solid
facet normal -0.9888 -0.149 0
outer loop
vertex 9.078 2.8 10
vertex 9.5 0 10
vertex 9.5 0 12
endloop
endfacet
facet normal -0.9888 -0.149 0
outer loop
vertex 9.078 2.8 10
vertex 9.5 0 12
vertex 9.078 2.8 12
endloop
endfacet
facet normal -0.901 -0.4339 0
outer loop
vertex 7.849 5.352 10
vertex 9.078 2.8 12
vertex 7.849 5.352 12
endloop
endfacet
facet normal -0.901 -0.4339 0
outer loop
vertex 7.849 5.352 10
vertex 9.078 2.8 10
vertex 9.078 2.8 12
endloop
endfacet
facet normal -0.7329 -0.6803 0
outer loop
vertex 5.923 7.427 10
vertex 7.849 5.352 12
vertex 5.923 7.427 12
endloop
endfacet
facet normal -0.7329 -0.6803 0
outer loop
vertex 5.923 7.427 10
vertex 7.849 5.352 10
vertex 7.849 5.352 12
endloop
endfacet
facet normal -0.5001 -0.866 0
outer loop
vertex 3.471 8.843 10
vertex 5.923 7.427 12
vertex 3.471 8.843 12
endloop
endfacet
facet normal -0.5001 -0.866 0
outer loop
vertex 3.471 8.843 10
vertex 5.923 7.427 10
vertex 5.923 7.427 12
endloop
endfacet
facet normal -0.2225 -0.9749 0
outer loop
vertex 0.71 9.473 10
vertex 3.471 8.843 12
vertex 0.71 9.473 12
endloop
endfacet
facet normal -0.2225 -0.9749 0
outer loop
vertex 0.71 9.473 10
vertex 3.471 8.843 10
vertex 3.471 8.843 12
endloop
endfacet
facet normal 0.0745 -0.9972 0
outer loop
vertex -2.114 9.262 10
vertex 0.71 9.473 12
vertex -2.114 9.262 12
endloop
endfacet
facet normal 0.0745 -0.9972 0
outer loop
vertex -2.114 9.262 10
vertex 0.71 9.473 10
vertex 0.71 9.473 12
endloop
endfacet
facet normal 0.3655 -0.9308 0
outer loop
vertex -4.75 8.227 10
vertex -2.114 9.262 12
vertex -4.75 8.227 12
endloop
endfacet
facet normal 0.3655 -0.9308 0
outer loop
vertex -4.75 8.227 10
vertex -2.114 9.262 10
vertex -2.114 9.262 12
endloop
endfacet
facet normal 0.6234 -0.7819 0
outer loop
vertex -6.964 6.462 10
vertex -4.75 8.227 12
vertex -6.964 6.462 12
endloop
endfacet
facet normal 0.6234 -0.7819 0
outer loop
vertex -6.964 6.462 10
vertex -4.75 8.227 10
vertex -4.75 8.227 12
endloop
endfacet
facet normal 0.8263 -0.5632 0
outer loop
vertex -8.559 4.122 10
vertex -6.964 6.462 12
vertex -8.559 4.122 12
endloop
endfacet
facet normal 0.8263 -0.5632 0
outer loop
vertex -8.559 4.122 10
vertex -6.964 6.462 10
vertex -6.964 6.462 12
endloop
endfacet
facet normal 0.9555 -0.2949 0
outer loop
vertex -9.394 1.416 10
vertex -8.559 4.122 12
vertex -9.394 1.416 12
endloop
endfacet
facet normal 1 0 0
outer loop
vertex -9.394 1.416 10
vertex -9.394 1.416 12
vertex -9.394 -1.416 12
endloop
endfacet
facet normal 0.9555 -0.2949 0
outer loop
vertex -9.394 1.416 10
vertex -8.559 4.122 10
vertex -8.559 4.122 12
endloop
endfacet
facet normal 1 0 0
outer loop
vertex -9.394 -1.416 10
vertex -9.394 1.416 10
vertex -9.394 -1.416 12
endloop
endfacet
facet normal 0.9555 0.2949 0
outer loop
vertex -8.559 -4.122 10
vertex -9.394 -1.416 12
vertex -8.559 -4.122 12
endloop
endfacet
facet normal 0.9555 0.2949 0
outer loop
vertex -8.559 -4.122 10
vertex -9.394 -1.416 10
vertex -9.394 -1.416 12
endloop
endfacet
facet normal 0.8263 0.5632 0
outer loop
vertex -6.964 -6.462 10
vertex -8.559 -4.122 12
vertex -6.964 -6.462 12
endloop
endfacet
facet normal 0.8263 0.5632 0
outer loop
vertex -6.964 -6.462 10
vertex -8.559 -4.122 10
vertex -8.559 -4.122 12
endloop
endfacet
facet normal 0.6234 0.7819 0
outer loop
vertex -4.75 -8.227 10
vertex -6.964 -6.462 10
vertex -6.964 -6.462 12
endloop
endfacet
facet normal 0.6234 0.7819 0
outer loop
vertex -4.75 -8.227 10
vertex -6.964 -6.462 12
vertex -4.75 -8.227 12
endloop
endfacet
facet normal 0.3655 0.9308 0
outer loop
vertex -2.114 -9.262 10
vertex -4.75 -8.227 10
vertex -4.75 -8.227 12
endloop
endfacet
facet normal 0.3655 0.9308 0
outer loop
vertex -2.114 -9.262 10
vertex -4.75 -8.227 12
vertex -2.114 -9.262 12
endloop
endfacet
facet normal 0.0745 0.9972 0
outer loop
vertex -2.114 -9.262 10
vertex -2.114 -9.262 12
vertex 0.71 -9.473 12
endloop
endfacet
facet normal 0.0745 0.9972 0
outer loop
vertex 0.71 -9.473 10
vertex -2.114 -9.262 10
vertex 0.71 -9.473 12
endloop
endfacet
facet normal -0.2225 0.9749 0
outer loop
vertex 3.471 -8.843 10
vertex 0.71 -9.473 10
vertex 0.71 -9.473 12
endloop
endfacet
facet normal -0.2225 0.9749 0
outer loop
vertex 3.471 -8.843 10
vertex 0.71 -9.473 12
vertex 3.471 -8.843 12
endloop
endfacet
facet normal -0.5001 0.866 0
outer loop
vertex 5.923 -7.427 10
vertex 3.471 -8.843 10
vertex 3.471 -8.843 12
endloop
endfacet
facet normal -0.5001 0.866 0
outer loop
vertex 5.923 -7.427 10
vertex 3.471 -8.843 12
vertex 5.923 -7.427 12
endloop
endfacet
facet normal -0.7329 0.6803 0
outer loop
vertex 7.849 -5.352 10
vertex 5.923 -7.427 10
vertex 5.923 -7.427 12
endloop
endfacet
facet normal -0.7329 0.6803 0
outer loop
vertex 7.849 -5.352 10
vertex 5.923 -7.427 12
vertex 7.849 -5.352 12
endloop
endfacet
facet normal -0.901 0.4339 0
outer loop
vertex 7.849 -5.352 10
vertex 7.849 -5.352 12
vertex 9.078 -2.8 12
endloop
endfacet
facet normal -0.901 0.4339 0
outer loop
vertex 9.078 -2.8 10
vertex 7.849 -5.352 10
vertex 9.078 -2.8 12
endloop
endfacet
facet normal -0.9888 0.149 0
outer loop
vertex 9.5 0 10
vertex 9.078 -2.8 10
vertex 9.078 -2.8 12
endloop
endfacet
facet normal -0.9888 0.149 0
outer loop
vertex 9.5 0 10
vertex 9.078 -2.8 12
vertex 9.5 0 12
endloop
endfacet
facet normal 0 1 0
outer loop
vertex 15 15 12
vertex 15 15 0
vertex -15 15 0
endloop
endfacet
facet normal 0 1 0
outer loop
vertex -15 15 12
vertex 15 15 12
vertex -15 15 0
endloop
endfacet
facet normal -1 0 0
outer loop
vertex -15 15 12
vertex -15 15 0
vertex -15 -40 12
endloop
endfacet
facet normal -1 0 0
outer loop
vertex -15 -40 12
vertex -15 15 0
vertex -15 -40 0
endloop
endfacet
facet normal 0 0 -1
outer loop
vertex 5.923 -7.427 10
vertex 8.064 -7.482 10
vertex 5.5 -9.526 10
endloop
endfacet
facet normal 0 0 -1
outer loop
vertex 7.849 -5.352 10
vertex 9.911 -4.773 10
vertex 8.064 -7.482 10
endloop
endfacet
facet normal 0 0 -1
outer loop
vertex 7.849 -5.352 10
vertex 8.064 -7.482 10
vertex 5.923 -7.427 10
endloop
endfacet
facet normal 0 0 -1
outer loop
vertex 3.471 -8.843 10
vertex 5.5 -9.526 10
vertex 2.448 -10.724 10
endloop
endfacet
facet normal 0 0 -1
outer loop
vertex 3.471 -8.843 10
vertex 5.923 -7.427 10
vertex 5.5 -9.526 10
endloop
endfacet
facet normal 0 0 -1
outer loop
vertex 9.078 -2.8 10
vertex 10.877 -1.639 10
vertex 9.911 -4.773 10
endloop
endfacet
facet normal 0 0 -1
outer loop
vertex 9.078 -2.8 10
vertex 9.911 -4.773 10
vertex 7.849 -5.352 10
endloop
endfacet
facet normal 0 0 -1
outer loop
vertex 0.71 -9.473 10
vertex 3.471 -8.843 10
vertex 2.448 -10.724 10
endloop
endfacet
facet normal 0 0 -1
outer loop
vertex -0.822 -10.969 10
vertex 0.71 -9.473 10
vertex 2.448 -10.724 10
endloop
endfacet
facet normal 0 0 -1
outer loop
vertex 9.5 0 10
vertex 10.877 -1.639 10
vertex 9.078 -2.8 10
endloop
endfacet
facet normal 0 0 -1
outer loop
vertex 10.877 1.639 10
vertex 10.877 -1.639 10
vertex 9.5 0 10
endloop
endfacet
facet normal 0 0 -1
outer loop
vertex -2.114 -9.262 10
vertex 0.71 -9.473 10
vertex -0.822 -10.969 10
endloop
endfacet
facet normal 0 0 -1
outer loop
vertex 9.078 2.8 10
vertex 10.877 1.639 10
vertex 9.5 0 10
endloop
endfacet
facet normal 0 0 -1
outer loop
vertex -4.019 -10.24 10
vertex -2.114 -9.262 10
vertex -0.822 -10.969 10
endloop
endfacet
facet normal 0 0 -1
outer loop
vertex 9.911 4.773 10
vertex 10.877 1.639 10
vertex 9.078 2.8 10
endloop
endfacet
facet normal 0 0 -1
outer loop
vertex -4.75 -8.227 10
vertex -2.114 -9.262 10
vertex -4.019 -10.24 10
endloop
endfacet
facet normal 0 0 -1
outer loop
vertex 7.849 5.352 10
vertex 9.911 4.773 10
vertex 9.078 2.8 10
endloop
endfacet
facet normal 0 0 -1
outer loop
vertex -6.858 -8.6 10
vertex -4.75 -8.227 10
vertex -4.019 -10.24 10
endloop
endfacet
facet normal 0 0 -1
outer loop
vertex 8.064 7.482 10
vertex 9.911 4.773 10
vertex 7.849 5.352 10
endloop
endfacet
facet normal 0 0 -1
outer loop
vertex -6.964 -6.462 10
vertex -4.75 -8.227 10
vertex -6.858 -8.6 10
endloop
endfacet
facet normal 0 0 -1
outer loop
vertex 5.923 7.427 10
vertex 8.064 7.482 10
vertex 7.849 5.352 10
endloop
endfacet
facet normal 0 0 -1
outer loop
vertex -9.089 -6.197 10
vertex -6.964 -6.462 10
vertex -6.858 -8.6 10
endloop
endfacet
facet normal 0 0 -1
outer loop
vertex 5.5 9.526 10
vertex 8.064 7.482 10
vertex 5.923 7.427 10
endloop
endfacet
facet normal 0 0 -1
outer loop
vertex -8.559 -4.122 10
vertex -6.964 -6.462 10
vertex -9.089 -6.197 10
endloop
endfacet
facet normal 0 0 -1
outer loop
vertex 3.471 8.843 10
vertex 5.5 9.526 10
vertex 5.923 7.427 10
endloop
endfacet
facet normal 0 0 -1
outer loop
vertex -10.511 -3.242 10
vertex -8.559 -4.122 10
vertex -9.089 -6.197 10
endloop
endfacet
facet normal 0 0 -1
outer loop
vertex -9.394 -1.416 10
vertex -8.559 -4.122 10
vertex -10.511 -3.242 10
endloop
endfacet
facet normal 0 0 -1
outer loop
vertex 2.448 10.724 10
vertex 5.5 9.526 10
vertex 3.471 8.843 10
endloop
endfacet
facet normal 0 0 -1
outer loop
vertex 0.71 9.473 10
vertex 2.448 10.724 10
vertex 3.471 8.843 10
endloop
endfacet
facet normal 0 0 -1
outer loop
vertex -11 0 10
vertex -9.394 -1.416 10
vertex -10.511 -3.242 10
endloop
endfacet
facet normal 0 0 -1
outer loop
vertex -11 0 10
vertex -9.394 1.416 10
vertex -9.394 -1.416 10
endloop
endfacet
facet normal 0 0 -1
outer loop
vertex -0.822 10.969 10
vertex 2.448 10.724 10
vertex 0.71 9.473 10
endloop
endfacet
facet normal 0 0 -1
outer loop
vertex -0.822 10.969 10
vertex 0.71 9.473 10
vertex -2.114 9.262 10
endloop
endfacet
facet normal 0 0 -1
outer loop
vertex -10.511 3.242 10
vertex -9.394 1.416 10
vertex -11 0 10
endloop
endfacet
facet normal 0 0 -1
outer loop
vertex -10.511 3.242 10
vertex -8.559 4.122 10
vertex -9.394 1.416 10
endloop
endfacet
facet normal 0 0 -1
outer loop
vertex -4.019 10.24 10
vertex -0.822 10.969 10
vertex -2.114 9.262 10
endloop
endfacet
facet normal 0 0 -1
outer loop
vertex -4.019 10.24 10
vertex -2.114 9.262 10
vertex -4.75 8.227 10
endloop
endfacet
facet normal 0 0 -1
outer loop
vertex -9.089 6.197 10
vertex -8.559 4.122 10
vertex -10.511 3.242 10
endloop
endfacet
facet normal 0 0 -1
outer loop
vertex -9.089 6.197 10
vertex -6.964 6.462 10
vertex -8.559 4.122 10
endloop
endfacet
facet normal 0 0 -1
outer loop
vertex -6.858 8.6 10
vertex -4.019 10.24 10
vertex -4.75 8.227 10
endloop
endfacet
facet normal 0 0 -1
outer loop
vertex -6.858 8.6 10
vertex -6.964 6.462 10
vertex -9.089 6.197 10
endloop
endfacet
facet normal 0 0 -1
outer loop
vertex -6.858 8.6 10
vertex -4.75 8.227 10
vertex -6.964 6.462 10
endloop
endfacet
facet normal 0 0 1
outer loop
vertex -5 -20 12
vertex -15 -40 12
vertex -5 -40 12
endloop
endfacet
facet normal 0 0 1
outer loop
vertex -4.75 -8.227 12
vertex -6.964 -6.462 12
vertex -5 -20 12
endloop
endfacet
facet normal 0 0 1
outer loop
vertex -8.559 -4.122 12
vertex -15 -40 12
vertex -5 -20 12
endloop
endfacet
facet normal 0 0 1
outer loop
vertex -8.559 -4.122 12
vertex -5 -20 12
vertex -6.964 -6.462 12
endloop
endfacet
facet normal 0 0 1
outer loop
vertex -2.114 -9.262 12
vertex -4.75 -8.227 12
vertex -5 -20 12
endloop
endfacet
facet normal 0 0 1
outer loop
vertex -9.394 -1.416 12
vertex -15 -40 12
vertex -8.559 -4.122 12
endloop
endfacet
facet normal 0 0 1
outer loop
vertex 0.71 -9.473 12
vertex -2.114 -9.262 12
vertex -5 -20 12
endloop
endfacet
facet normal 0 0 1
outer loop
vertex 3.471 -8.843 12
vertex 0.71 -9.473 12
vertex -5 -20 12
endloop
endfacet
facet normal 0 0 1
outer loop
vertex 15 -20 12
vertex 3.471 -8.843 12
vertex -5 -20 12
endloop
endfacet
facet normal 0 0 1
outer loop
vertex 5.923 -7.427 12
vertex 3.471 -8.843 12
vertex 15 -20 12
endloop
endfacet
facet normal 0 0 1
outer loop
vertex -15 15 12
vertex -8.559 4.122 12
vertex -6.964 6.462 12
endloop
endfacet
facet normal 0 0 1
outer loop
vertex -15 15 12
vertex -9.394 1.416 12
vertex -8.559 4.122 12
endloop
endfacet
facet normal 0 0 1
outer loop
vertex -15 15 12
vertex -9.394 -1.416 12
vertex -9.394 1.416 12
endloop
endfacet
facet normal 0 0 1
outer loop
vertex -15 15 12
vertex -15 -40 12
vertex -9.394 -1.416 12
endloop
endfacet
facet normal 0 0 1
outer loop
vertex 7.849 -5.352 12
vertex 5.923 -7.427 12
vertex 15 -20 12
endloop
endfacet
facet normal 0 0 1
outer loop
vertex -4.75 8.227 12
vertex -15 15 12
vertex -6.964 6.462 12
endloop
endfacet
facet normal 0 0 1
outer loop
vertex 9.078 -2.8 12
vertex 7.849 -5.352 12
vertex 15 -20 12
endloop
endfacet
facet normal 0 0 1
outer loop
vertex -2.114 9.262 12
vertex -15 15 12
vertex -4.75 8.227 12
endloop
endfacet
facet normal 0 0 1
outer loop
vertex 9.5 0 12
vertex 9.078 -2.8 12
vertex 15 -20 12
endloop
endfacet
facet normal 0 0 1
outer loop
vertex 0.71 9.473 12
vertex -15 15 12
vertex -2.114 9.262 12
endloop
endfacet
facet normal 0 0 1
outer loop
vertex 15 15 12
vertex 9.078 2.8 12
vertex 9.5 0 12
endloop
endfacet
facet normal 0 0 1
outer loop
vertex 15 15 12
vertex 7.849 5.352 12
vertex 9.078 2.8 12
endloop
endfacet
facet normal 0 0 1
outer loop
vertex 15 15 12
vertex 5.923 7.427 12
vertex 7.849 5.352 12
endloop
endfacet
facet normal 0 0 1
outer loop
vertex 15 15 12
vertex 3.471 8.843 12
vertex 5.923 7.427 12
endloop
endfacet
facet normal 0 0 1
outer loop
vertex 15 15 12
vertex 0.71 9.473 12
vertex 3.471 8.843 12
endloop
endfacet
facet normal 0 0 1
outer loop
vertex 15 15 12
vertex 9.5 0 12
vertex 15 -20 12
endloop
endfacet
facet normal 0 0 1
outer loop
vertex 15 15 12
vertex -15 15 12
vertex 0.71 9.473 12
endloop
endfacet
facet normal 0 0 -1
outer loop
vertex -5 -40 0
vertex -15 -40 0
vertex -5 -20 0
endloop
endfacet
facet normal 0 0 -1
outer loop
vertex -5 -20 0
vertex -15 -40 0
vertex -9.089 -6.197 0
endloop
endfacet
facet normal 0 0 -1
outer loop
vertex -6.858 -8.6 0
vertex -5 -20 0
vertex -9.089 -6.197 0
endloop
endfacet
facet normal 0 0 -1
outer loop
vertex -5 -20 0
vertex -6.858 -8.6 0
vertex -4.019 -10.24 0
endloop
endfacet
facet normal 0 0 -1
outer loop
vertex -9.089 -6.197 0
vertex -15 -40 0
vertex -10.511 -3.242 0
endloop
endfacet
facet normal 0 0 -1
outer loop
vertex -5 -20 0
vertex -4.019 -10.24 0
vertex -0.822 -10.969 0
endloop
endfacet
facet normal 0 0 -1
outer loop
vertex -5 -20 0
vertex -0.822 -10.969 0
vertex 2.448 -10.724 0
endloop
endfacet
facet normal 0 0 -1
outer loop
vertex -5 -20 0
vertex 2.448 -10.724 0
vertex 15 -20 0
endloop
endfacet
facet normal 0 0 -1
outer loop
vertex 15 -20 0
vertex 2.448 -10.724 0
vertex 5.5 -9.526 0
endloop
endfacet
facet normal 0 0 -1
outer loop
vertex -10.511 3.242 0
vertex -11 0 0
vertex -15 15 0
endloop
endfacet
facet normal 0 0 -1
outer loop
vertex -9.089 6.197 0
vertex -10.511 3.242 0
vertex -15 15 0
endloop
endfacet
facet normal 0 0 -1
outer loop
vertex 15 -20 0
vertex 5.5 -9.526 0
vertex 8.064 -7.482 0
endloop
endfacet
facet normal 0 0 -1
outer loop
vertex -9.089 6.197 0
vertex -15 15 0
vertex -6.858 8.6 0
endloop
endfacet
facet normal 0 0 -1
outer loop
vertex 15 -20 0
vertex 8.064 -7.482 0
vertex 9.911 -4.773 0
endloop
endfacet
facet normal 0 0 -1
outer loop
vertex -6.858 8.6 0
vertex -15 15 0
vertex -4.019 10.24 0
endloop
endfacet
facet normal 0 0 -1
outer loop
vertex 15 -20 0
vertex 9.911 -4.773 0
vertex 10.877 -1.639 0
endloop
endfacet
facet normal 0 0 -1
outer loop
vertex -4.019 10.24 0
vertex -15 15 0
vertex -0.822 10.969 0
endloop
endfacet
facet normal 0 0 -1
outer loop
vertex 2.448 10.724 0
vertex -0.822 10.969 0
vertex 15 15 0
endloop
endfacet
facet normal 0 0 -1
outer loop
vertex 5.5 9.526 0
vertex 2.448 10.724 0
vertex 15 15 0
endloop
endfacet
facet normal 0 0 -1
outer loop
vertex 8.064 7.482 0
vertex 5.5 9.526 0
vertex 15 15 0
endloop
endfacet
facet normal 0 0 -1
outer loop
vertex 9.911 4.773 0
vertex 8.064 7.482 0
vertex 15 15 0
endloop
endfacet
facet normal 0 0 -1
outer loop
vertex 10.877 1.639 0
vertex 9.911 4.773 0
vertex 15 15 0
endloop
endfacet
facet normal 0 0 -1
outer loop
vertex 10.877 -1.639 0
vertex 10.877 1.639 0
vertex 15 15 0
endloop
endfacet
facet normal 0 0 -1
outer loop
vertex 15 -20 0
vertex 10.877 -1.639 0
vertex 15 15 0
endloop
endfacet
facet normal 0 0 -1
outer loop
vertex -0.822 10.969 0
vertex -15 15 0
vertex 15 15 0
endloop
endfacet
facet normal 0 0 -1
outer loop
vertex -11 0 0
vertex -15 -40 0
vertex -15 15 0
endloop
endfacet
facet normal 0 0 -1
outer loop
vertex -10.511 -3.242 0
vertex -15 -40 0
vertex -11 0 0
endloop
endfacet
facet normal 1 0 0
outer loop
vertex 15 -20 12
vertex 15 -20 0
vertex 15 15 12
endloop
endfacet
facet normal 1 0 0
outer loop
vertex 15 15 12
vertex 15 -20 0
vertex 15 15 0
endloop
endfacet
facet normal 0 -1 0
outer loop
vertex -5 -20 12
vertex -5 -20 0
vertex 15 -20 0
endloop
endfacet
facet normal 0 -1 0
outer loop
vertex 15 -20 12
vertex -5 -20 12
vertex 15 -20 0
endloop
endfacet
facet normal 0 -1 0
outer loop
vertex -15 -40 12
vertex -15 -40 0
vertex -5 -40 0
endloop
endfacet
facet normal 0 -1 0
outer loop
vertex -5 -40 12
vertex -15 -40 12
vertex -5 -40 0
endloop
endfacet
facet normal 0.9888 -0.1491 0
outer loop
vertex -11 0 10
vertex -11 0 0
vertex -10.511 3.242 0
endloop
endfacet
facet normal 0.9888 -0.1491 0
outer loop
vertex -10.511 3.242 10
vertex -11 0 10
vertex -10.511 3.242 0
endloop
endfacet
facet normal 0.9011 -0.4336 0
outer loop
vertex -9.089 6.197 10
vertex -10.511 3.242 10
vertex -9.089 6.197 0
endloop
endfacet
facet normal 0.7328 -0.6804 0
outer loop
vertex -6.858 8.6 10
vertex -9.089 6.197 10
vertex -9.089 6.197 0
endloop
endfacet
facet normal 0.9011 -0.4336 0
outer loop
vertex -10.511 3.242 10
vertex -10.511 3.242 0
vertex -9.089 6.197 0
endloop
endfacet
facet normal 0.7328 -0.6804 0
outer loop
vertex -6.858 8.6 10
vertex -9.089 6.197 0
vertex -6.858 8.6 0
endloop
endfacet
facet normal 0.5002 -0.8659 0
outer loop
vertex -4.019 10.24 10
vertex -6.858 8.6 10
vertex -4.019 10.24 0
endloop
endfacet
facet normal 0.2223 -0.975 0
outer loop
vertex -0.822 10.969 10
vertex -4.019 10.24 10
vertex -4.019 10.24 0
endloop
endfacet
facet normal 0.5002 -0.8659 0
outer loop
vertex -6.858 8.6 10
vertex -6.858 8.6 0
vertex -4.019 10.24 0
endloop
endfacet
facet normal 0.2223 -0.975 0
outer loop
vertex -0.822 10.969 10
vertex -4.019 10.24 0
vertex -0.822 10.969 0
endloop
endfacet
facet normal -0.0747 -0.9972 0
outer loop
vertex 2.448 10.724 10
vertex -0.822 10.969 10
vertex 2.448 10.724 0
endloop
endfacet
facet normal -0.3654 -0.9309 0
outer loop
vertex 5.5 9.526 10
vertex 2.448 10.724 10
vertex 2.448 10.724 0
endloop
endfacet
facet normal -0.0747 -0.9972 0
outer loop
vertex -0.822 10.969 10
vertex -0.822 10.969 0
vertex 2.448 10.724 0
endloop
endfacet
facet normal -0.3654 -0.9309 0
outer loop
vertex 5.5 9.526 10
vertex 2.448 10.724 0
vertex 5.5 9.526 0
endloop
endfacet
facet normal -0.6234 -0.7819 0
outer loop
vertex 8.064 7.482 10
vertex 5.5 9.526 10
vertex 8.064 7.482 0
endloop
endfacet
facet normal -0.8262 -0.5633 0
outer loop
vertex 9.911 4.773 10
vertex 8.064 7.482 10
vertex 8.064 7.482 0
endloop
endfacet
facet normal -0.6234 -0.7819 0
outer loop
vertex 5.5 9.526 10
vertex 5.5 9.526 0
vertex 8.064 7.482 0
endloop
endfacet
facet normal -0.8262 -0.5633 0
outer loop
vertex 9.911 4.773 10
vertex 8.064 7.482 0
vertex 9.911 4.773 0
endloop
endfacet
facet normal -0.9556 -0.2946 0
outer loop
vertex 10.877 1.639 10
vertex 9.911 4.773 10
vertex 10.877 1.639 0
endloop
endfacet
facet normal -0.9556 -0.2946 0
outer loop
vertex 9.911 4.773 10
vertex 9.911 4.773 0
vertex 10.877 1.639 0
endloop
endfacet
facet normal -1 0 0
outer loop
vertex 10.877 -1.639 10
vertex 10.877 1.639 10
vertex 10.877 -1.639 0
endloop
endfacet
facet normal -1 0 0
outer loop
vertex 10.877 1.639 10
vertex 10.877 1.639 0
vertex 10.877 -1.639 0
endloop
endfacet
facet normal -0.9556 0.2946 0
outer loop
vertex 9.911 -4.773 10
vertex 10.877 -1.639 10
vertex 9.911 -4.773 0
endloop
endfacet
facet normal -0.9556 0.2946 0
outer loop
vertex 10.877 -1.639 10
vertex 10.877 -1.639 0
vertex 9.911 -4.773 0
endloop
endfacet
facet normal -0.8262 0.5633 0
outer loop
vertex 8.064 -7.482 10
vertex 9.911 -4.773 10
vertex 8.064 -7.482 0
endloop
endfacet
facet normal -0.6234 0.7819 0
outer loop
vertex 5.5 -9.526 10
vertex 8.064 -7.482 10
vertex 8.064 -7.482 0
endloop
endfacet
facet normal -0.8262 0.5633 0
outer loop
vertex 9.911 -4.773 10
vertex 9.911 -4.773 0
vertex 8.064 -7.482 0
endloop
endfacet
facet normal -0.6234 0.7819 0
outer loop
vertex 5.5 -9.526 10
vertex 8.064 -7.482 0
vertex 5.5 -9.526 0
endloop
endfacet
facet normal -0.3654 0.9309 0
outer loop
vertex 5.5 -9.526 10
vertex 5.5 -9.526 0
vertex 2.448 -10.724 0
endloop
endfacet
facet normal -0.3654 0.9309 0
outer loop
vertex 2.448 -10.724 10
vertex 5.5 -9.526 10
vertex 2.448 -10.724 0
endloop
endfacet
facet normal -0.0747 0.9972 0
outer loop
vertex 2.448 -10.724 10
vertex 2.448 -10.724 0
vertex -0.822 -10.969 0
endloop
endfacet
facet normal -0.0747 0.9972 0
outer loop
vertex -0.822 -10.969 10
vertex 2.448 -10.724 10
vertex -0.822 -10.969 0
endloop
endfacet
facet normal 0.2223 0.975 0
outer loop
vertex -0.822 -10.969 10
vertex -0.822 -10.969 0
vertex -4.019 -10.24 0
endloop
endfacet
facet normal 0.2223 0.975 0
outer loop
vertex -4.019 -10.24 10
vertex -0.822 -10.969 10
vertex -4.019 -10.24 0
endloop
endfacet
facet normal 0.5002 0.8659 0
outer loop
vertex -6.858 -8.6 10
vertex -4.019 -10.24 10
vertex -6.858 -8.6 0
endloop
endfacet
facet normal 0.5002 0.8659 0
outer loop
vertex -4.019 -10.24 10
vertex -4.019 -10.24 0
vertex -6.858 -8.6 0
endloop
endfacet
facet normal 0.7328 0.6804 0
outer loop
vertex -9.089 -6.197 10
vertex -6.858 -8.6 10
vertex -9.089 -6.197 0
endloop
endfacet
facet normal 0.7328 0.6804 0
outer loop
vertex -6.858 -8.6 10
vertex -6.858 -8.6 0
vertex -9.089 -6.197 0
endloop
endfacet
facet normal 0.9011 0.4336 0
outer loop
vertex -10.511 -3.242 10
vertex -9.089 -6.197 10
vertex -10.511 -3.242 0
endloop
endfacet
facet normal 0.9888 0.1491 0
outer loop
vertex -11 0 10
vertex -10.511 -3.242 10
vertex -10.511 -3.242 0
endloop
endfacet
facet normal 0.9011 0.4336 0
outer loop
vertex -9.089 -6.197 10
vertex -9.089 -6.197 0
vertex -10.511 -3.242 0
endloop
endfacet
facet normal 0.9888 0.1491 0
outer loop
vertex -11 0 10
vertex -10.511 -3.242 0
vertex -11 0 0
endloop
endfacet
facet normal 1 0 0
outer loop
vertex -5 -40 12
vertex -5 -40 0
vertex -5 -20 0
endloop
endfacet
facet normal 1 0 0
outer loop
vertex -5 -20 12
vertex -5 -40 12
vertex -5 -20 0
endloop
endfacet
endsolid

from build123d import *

# Parameters (mm, degrees)
SKIZZE1_R                       = 9.5
AUFSATZ_LINEAR_AUSTRAGEN2_DEPTH = 12
SKIZZE9_R                       = 11
SCHNITT_LINEAR_AUSTRAGEN2_DEPTH = 10


with BuildPart() as part:
    # Skizze1 → Aufsatz-Linear austragen2 (new body)
    with BuildSketch(Plane.XY):
        Polygon((15, 15), (-15, 15), (-15, -40), (-5, -40), (-5, -20), (15, -20), align=None)
        Circle(SKIZZE1_R, mode=Mode.SUBTRACT)
    extrude(amount=AUFSATZ_LINEAR_AUSTRAGEN2_DEPTH)

    # Skizze9 → Schnitt-Linear austragen2 (cut)
    with BuildSketch(Plane(origin=(0, 0, 0), x_dir=(-1, 0, 0), z_dir=(0, 0, -1))):
        Circle(SKIZZE9_R)
    extrude(amount=-SCHNITT_LINEAR_AUSTRAGEN2_DEPTH, mode=Mode.SUBTRACT)


solid = part.part
